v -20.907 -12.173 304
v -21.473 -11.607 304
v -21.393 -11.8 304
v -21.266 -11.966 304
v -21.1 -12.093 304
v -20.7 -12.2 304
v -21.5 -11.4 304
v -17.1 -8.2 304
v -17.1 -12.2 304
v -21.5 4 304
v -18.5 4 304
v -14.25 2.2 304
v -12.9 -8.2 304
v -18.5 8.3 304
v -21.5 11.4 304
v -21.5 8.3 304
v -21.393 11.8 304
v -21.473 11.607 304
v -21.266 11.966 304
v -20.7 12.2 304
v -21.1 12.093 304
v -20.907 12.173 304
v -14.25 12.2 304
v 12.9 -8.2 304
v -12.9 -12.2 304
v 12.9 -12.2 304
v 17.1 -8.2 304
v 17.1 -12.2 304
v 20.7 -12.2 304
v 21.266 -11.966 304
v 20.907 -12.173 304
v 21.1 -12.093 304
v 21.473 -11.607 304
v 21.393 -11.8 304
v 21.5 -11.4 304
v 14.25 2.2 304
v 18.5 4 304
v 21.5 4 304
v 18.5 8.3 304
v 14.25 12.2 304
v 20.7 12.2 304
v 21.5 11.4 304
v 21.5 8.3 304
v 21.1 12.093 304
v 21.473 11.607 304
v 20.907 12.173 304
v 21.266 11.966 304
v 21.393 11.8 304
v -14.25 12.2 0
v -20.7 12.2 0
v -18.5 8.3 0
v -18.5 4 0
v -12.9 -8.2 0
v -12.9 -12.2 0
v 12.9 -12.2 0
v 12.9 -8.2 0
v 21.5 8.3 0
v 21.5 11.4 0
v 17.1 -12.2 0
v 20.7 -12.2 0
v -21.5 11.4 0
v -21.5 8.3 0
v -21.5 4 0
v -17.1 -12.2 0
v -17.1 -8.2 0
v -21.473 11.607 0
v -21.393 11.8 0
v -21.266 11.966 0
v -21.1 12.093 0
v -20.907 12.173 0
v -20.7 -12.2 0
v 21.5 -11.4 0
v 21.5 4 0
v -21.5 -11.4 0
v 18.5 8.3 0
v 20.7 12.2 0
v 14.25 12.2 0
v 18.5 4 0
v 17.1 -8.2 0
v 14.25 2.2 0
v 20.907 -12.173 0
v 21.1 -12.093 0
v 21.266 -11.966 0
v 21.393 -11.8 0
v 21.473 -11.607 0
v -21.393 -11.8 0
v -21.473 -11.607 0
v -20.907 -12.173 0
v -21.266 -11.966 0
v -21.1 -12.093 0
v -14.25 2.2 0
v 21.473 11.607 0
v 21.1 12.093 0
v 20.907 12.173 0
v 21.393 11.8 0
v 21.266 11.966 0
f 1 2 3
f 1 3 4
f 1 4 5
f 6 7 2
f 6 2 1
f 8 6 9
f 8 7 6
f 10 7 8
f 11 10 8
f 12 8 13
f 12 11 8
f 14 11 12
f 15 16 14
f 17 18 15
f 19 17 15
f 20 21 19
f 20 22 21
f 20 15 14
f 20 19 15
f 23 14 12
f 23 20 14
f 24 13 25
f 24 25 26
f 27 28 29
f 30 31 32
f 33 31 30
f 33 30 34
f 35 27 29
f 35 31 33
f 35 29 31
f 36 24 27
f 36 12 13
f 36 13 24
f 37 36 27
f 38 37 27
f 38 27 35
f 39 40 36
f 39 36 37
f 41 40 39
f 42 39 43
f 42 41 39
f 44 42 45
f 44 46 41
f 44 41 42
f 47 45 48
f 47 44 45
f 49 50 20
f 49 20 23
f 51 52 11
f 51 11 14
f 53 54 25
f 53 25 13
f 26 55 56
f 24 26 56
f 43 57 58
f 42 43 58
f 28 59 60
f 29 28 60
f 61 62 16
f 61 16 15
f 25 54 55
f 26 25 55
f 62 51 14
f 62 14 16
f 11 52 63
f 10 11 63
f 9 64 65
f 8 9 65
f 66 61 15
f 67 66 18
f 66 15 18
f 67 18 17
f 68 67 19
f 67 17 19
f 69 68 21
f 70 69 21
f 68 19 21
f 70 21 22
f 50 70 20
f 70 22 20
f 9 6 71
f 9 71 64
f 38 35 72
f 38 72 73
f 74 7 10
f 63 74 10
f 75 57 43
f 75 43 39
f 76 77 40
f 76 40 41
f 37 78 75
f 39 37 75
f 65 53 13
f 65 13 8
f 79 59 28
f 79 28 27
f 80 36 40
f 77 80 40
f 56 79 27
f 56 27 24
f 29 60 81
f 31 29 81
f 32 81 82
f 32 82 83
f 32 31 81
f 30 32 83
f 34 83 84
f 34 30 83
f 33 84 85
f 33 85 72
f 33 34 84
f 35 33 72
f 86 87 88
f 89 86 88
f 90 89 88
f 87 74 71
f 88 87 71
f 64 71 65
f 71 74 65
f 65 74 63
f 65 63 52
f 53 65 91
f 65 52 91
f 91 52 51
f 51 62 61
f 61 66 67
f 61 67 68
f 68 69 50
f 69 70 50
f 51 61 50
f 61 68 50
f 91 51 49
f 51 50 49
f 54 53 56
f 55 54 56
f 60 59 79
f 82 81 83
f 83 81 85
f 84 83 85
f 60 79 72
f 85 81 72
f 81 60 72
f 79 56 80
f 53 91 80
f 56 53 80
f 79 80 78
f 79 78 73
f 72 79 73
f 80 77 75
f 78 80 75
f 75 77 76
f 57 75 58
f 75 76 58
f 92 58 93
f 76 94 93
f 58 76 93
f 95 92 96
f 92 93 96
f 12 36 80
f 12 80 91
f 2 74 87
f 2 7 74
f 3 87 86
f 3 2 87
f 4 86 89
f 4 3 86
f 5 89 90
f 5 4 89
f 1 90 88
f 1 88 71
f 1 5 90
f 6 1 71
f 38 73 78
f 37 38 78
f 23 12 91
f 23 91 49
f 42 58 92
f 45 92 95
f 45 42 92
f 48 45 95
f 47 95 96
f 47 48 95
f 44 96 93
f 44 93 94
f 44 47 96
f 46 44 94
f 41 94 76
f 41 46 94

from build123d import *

# Parameters (mm, degrees)
SKETCH1_W           = 43
SKETCH1_H           = 24.4
BOSS_EXTRUDE1_DEPTH = 304
FILLET1_R           = 0.8
SKETCH3_W           = 3
SKETCH3_H           = 4.3
CUT_EXTRUDE1_DEPTH  = 306.00342621
SKETCH5_W           = 28.5
SKETCH5_H           = 10
CUT_EXTRUDE2_DEPTH  = 306.00342621
SKETCH6_W           = 4.2
SKETCH6_H           = 8
CUT_EXTRUDE3_DEPTH  = 306.00342621


with BuildPart() as part:
    # Sketch1 → Boss-Extrude1 (new body)
    with BuildSketch(Plane.XY):
        Rectangle(SKETCH1_W, SKETCH1_H)
    extrude(amount=BOSS_EXTRUDE1_DEPTH)

    # Fillet1
    fillet1_edges = [part.edges().sort_by_distance(p)[0] for p in [
        (21.5, -12.2, 152),
        (-21.5, -12.2, 152),
        (-21.5, 12.2, 152),
        (21.5, 12.2, 152),
    ]]
    fillet(fillet1_edges, radius=FILLET1_R)

    # Sketch3 → Cut-Extrude1 (cut, through all)
    with BuildSketch(Plane(origin=(0, 0, 0), x_dir=(-1, 0, 0), z_dir=(0, 0, -1))):
        with Locations((-20, 6.15)):
            Rectangle(SKETCH3_W, SKETCH3_H)
        with Locations((20, 6.15)):
            Rectangle(SKETCH3_W, SKETCH3_H)
    extrude(amount=-CUT_EXTRUDE1_DEPTH, mode=Mode.SUBTRACT)

    # Sketch5 → Cut-Extrude2 (cut, through all)
    with BuildSketch(Plane(origin=(0, 0, 0), x_dir=(-1, 0, 0), z_dir=(0, 0, -1))):
        with Locations((0, 7.2)):
            Rectangle(SKETCH5_W, SKETCH5_H)
    extrude(amount=-CUT_EXTRUDE2_DEPTH, mode=Mode.SUBTRACT)

    # Sketch6 → Cut-Extrude3 (cut, through all)
    with BuildSketch(Plane(origin=(0, 0, 0), x_dir=(-1, 0, 0), z_dir=(0, 0, -1))):
        with Locations((-15, -12.2)):
            Rectangle(SKETCH6_W, SKETCH6_H)
        with Locations((15, -12.2)):
            Rectangle(SKETCH6_W, SKETCH6_H)
    extrude(amount=-CUT_EXTRUDE3_DEPTH, mode=Mode.SUBTRACT)


solid = part.part
